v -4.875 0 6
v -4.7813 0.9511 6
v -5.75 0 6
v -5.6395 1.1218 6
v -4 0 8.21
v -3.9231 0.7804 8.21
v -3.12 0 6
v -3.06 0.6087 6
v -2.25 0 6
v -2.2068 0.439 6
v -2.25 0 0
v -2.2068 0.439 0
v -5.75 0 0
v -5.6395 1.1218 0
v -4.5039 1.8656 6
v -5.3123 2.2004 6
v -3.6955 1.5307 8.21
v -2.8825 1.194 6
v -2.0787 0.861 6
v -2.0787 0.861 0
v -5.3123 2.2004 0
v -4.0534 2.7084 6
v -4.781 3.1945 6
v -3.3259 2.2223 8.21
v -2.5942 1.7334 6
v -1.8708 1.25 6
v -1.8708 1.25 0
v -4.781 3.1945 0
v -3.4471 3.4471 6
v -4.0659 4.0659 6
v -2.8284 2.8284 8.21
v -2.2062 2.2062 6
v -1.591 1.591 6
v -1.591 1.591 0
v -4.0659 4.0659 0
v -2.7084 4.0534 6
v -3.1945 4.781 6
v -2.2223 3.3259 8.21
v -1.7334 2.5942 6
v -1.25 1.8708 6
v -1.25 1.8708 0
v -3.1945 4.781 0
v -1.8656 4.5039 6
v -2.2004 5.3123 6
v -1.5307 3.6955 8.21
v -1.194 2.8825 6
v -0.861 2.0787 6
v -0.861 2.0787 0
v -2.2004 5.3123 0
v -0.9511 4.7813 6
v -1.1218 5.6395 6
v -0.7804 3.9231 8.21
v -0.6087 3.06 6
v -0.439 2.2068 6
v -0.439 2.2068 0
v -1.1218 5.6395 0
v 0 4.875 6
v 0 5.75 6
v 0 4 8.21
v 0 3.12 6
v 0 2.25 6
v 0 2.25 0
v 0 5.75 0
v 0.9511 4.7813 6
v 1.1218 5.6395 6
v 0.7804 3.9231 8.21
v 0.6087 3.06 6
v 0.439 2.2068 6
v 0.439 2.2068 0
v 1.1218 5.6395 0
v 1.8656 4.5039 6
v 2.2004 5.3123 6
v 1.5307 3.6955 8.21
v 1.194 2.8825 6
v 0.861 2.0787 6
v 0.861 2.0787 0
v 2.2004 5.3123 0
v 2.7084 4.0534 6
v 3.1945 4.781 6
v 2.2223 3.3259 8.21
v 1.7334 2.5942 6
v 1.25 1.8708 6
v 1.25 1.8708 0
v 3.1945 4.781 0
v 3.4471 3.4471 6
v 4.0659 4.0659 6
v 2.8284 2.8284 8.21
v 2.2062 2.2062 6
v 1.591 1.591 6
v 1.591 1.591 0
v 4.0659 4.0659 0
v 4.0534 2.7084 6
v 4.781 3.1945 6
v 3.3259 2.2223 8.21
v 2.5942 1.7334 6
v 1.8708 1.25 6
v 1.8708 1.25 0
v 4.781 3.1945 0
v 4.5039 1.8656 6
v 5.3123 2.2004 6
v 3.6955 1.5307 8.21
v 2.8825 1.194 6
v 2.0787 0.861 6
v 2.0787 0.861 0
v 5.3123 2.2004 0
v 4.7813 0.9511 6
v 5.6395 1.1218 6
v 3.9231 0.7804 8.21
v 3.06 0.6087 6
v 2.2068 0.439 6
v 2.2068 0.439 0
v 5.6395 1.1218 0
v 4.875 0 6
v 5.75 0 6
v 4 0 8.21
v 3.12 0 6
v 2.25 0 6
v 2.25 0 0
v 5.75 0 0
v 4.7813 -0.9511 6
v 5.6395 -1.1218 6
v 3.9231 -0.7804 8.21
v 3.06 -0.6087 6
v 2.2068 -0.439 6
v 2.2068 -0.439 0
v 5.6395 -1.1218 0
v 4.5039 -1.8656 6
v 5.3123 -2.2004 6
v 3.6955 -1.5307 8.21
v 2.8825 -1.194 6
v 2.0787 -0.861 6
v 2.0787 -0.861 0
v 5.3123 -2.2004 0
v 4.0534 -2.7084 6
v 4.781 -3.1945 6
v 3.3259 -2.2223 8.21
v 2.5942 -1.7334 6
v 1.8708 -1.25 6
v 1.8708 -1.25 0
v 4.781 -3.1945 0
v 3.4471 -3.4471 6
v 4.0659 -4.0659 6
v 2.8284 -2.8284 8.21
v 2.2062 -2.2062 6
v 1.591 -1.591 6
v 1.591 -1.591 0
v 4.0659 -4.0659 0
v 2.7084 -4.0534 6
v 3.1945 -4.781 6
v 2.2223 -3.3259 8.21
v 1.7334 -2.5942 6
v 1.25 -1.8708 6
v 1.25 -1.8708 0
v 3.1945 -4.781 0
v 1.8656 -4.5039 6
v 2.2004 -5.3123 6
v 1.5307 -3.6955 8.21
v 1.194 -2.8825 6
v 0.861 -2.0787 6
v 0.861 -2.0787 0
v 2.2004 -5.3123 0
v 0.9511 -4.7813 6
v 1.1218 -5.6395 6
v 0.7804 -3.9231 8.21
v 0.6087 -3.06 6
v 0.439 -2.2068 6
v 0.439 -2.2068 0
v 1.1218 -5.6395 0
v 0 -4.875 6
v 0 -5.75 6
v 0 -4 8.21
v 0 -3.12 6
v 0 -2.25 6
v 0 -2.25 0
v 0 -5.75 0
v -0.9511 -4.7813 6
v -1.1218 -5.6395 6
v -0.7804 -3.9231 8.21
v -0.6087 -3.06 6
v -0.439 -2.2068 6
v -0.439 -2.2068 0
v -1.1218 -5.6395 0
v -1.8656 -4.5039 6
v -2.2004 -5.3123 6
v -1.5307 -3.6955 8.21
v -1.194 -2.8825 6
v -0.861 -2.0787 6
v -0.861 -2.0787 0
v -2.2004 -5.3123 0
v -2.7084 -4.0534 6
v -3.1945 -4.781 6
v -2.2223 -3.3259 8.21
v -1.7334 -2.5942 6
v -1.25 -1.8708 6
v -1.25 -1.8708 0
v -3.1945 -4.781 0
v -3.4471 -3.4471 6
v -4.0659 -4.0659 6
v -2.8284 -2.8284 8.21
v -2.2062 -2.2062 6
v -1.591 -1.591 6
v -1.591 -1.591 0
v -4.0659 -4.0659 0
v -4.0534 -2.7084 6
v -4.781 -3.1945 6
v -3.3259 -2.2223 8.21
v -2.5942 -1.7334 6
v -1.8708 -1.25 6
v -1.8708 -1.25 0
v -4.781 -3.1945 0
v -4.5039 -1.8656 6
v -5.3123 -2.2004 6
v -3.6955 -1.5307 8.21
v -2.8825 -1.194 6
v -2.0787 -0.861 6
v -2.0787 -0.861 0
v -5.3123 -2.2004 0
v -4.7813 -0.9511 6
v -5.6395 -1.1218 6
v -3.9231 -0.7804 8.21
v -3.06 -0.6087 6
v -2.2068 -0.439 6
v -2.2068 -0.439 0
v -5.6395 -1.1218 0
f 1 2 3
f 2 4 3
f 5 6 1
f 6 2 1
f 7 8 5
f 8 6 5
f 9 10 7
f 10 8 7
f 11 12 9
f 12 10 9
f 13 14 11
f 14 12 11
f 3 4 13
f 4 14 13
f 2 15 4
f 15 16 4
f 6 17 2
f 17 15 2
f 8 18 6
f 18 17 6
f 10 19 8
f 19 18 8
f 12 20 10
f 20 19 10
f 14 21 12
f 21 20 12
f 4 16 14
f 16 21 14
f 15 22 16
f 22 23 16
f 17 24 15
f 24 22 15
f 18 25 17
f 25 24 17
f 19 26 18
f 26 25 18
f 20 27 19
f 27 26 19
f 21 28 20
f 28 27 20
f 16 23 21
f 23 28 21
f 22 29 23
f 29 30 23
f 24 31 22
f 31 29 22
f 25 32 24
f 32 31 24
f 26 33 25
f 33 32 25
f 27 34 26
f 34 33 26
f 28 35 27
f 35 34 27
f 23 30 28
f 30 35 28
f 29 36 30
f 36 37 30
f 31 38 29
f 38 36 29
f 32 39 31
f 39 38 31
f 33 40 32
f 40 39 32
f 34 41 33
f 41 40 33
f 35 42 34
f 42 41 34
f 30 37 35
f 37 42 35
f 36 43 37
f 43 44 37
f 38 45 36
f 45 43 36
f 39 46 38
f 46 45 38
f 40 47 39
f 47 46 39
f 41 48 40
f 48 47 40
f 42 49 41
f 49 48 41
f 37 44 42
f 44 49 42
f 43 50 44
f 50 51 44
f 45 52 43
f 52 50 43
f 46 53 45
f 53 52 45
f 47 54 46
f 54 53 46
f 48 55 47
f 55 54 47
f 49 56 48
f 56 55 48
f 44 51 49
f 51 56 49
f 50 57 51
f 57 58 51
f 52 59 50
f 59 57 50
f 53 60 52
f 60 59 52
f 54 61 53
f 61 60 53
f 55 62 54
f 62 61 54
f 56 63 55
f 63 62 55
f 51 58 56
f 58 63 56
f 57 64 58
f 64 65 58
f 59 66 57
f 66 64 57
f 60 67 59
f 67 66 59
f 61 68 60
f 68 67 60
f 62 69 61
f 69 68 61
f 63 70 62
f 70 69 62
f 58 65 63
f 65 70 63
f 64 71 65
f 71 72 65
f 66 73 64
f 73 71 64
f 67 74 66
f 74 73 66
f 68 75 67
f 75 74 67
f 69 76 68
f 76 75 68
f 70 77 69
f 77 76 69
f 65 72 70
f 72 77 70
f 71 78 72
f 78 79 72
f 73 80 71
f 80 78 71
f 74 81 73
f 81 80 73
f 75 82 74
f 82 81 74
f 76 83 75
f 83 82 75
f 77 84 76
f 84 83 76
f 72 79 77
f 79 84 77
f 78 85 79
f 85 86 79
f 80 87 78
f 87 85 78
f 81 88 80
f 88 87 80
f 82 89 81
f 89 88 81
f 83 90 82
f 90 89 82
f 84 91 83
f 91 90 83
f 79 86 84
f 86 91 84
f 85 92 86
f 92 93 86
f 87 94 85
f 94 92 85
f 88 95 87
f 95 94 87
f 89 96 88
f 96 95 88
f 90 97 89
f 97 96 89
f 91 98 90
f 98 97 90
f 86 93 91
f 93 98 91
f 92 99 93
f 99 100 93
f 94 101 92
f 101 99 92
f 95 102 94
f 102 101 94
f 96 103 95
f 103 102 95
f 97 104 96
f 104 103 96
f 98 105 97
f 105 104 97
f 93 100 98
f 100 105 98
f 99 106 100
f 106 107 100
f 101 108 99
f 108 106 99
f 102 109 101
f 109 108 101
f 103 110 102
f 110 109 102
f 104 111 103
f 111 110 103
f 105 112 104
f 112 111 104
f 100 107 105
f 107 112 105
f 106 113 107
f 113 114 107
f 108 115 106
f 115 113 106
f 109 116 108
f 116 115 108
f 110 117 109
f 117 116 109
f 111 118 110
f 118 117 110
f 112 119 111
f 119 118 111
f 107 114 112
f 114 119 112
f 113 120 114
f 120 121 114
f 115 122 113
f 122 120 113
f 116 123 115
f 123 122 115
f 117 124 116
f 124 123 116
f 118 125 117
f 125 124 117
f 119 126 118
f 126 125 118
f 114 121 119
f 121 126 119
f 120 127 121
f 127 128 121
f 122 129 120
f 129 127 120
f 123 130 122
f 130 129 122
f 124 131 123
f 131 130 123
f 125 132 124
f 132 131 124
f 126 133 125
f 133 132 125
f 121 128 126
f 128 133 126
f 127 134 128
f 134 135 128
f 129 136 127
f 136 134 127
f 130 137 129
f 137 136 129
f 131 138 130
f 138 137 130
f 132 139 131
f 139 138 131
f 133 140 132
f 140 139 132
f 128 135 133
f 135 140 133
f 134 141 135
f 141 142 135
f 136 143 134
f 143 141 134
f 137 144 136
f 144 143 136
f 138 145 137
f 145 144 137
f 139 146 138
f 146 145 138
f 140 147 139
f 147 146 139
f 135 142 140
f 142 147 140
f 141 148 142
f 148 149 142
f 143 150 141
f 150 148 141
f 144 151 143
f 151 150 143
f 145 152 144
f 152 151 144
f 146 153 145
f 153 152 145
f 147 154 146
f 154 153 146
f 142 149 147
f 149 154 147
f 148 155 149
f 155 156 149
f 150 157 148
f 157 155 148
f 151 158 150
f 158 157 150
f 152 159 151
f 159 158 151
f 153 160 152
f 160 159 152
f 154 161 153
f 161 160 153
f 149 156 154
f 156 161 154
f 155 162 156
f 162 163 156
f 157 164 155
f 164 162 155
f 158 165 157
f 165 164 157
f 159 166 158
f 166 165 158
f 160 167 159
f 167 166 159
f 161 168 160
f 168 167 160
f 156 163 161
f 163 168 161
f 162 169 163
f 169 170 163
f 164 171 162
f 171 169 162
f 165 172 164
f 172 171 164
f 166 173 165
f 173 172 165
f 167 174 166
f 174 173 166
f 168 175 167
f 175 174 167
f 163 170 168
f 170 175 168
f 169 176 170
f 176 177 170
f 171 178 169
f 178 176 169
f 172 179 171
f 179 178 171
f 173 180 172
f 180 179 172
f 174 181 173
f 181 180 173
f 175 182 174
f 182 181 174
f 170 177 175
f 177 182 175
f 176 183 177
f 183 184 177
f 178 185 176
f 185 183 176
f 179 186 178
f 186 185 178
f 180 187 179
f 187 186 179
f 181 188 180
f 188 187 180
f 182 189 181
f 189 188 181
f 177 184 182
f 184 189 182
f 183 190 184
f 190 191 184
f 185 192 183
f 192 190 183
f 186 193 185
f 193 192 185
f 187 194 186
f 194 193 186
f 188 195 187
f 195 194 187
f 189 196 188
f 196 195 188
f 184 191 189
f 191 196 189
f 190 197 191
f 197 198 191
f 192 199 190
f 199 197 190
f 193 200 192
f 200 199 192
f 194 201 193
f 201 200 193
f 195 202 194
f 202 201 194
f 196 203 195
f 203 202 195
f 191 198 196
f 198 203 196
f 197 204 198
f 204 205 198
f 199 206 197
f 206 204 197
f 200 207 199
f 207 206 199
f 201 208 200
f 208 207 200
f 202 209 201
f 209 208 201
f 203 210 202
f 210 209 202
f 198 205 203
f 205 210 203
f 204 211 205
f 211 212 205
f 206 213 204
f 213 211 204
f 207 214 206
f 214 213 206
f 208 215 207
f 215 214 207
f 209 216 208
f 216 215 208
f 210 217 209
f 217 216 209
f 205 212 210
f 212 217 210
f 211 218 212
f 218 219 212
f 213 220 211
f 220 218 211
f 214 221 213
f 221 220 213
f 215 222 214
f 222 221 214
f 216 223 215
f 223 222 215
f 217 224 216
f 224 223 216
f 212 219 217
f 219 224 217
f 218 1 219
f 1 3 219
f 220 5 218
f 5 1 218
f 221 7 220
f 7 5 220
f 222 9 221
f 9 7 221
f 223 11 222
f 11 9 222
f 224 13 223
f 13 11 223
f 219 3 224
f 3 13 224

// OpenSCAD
$fn = 32;

// ----------------------------------------------------------------------
// Form washer: domed washer, 11.5 mm outside, 4.5 mm bore
// ----------------------------------------------------------------------

// --- parameters (mm) ---
revolve_angle = 360;      // full turn around the Z axis
profile_points = 7;       // points of the closed outline

profile = [[2.25, 0], [5.75, 0], [5.75, 6], [4.875, 6], [4, 8.21], [3.12, 6], [2.25, 6]];  // single closed polygon, 7 points, counter clockwise

// --- the one profile operation ---
rotate_extrude(angle = revolve_angle) polygon(points = profile);
